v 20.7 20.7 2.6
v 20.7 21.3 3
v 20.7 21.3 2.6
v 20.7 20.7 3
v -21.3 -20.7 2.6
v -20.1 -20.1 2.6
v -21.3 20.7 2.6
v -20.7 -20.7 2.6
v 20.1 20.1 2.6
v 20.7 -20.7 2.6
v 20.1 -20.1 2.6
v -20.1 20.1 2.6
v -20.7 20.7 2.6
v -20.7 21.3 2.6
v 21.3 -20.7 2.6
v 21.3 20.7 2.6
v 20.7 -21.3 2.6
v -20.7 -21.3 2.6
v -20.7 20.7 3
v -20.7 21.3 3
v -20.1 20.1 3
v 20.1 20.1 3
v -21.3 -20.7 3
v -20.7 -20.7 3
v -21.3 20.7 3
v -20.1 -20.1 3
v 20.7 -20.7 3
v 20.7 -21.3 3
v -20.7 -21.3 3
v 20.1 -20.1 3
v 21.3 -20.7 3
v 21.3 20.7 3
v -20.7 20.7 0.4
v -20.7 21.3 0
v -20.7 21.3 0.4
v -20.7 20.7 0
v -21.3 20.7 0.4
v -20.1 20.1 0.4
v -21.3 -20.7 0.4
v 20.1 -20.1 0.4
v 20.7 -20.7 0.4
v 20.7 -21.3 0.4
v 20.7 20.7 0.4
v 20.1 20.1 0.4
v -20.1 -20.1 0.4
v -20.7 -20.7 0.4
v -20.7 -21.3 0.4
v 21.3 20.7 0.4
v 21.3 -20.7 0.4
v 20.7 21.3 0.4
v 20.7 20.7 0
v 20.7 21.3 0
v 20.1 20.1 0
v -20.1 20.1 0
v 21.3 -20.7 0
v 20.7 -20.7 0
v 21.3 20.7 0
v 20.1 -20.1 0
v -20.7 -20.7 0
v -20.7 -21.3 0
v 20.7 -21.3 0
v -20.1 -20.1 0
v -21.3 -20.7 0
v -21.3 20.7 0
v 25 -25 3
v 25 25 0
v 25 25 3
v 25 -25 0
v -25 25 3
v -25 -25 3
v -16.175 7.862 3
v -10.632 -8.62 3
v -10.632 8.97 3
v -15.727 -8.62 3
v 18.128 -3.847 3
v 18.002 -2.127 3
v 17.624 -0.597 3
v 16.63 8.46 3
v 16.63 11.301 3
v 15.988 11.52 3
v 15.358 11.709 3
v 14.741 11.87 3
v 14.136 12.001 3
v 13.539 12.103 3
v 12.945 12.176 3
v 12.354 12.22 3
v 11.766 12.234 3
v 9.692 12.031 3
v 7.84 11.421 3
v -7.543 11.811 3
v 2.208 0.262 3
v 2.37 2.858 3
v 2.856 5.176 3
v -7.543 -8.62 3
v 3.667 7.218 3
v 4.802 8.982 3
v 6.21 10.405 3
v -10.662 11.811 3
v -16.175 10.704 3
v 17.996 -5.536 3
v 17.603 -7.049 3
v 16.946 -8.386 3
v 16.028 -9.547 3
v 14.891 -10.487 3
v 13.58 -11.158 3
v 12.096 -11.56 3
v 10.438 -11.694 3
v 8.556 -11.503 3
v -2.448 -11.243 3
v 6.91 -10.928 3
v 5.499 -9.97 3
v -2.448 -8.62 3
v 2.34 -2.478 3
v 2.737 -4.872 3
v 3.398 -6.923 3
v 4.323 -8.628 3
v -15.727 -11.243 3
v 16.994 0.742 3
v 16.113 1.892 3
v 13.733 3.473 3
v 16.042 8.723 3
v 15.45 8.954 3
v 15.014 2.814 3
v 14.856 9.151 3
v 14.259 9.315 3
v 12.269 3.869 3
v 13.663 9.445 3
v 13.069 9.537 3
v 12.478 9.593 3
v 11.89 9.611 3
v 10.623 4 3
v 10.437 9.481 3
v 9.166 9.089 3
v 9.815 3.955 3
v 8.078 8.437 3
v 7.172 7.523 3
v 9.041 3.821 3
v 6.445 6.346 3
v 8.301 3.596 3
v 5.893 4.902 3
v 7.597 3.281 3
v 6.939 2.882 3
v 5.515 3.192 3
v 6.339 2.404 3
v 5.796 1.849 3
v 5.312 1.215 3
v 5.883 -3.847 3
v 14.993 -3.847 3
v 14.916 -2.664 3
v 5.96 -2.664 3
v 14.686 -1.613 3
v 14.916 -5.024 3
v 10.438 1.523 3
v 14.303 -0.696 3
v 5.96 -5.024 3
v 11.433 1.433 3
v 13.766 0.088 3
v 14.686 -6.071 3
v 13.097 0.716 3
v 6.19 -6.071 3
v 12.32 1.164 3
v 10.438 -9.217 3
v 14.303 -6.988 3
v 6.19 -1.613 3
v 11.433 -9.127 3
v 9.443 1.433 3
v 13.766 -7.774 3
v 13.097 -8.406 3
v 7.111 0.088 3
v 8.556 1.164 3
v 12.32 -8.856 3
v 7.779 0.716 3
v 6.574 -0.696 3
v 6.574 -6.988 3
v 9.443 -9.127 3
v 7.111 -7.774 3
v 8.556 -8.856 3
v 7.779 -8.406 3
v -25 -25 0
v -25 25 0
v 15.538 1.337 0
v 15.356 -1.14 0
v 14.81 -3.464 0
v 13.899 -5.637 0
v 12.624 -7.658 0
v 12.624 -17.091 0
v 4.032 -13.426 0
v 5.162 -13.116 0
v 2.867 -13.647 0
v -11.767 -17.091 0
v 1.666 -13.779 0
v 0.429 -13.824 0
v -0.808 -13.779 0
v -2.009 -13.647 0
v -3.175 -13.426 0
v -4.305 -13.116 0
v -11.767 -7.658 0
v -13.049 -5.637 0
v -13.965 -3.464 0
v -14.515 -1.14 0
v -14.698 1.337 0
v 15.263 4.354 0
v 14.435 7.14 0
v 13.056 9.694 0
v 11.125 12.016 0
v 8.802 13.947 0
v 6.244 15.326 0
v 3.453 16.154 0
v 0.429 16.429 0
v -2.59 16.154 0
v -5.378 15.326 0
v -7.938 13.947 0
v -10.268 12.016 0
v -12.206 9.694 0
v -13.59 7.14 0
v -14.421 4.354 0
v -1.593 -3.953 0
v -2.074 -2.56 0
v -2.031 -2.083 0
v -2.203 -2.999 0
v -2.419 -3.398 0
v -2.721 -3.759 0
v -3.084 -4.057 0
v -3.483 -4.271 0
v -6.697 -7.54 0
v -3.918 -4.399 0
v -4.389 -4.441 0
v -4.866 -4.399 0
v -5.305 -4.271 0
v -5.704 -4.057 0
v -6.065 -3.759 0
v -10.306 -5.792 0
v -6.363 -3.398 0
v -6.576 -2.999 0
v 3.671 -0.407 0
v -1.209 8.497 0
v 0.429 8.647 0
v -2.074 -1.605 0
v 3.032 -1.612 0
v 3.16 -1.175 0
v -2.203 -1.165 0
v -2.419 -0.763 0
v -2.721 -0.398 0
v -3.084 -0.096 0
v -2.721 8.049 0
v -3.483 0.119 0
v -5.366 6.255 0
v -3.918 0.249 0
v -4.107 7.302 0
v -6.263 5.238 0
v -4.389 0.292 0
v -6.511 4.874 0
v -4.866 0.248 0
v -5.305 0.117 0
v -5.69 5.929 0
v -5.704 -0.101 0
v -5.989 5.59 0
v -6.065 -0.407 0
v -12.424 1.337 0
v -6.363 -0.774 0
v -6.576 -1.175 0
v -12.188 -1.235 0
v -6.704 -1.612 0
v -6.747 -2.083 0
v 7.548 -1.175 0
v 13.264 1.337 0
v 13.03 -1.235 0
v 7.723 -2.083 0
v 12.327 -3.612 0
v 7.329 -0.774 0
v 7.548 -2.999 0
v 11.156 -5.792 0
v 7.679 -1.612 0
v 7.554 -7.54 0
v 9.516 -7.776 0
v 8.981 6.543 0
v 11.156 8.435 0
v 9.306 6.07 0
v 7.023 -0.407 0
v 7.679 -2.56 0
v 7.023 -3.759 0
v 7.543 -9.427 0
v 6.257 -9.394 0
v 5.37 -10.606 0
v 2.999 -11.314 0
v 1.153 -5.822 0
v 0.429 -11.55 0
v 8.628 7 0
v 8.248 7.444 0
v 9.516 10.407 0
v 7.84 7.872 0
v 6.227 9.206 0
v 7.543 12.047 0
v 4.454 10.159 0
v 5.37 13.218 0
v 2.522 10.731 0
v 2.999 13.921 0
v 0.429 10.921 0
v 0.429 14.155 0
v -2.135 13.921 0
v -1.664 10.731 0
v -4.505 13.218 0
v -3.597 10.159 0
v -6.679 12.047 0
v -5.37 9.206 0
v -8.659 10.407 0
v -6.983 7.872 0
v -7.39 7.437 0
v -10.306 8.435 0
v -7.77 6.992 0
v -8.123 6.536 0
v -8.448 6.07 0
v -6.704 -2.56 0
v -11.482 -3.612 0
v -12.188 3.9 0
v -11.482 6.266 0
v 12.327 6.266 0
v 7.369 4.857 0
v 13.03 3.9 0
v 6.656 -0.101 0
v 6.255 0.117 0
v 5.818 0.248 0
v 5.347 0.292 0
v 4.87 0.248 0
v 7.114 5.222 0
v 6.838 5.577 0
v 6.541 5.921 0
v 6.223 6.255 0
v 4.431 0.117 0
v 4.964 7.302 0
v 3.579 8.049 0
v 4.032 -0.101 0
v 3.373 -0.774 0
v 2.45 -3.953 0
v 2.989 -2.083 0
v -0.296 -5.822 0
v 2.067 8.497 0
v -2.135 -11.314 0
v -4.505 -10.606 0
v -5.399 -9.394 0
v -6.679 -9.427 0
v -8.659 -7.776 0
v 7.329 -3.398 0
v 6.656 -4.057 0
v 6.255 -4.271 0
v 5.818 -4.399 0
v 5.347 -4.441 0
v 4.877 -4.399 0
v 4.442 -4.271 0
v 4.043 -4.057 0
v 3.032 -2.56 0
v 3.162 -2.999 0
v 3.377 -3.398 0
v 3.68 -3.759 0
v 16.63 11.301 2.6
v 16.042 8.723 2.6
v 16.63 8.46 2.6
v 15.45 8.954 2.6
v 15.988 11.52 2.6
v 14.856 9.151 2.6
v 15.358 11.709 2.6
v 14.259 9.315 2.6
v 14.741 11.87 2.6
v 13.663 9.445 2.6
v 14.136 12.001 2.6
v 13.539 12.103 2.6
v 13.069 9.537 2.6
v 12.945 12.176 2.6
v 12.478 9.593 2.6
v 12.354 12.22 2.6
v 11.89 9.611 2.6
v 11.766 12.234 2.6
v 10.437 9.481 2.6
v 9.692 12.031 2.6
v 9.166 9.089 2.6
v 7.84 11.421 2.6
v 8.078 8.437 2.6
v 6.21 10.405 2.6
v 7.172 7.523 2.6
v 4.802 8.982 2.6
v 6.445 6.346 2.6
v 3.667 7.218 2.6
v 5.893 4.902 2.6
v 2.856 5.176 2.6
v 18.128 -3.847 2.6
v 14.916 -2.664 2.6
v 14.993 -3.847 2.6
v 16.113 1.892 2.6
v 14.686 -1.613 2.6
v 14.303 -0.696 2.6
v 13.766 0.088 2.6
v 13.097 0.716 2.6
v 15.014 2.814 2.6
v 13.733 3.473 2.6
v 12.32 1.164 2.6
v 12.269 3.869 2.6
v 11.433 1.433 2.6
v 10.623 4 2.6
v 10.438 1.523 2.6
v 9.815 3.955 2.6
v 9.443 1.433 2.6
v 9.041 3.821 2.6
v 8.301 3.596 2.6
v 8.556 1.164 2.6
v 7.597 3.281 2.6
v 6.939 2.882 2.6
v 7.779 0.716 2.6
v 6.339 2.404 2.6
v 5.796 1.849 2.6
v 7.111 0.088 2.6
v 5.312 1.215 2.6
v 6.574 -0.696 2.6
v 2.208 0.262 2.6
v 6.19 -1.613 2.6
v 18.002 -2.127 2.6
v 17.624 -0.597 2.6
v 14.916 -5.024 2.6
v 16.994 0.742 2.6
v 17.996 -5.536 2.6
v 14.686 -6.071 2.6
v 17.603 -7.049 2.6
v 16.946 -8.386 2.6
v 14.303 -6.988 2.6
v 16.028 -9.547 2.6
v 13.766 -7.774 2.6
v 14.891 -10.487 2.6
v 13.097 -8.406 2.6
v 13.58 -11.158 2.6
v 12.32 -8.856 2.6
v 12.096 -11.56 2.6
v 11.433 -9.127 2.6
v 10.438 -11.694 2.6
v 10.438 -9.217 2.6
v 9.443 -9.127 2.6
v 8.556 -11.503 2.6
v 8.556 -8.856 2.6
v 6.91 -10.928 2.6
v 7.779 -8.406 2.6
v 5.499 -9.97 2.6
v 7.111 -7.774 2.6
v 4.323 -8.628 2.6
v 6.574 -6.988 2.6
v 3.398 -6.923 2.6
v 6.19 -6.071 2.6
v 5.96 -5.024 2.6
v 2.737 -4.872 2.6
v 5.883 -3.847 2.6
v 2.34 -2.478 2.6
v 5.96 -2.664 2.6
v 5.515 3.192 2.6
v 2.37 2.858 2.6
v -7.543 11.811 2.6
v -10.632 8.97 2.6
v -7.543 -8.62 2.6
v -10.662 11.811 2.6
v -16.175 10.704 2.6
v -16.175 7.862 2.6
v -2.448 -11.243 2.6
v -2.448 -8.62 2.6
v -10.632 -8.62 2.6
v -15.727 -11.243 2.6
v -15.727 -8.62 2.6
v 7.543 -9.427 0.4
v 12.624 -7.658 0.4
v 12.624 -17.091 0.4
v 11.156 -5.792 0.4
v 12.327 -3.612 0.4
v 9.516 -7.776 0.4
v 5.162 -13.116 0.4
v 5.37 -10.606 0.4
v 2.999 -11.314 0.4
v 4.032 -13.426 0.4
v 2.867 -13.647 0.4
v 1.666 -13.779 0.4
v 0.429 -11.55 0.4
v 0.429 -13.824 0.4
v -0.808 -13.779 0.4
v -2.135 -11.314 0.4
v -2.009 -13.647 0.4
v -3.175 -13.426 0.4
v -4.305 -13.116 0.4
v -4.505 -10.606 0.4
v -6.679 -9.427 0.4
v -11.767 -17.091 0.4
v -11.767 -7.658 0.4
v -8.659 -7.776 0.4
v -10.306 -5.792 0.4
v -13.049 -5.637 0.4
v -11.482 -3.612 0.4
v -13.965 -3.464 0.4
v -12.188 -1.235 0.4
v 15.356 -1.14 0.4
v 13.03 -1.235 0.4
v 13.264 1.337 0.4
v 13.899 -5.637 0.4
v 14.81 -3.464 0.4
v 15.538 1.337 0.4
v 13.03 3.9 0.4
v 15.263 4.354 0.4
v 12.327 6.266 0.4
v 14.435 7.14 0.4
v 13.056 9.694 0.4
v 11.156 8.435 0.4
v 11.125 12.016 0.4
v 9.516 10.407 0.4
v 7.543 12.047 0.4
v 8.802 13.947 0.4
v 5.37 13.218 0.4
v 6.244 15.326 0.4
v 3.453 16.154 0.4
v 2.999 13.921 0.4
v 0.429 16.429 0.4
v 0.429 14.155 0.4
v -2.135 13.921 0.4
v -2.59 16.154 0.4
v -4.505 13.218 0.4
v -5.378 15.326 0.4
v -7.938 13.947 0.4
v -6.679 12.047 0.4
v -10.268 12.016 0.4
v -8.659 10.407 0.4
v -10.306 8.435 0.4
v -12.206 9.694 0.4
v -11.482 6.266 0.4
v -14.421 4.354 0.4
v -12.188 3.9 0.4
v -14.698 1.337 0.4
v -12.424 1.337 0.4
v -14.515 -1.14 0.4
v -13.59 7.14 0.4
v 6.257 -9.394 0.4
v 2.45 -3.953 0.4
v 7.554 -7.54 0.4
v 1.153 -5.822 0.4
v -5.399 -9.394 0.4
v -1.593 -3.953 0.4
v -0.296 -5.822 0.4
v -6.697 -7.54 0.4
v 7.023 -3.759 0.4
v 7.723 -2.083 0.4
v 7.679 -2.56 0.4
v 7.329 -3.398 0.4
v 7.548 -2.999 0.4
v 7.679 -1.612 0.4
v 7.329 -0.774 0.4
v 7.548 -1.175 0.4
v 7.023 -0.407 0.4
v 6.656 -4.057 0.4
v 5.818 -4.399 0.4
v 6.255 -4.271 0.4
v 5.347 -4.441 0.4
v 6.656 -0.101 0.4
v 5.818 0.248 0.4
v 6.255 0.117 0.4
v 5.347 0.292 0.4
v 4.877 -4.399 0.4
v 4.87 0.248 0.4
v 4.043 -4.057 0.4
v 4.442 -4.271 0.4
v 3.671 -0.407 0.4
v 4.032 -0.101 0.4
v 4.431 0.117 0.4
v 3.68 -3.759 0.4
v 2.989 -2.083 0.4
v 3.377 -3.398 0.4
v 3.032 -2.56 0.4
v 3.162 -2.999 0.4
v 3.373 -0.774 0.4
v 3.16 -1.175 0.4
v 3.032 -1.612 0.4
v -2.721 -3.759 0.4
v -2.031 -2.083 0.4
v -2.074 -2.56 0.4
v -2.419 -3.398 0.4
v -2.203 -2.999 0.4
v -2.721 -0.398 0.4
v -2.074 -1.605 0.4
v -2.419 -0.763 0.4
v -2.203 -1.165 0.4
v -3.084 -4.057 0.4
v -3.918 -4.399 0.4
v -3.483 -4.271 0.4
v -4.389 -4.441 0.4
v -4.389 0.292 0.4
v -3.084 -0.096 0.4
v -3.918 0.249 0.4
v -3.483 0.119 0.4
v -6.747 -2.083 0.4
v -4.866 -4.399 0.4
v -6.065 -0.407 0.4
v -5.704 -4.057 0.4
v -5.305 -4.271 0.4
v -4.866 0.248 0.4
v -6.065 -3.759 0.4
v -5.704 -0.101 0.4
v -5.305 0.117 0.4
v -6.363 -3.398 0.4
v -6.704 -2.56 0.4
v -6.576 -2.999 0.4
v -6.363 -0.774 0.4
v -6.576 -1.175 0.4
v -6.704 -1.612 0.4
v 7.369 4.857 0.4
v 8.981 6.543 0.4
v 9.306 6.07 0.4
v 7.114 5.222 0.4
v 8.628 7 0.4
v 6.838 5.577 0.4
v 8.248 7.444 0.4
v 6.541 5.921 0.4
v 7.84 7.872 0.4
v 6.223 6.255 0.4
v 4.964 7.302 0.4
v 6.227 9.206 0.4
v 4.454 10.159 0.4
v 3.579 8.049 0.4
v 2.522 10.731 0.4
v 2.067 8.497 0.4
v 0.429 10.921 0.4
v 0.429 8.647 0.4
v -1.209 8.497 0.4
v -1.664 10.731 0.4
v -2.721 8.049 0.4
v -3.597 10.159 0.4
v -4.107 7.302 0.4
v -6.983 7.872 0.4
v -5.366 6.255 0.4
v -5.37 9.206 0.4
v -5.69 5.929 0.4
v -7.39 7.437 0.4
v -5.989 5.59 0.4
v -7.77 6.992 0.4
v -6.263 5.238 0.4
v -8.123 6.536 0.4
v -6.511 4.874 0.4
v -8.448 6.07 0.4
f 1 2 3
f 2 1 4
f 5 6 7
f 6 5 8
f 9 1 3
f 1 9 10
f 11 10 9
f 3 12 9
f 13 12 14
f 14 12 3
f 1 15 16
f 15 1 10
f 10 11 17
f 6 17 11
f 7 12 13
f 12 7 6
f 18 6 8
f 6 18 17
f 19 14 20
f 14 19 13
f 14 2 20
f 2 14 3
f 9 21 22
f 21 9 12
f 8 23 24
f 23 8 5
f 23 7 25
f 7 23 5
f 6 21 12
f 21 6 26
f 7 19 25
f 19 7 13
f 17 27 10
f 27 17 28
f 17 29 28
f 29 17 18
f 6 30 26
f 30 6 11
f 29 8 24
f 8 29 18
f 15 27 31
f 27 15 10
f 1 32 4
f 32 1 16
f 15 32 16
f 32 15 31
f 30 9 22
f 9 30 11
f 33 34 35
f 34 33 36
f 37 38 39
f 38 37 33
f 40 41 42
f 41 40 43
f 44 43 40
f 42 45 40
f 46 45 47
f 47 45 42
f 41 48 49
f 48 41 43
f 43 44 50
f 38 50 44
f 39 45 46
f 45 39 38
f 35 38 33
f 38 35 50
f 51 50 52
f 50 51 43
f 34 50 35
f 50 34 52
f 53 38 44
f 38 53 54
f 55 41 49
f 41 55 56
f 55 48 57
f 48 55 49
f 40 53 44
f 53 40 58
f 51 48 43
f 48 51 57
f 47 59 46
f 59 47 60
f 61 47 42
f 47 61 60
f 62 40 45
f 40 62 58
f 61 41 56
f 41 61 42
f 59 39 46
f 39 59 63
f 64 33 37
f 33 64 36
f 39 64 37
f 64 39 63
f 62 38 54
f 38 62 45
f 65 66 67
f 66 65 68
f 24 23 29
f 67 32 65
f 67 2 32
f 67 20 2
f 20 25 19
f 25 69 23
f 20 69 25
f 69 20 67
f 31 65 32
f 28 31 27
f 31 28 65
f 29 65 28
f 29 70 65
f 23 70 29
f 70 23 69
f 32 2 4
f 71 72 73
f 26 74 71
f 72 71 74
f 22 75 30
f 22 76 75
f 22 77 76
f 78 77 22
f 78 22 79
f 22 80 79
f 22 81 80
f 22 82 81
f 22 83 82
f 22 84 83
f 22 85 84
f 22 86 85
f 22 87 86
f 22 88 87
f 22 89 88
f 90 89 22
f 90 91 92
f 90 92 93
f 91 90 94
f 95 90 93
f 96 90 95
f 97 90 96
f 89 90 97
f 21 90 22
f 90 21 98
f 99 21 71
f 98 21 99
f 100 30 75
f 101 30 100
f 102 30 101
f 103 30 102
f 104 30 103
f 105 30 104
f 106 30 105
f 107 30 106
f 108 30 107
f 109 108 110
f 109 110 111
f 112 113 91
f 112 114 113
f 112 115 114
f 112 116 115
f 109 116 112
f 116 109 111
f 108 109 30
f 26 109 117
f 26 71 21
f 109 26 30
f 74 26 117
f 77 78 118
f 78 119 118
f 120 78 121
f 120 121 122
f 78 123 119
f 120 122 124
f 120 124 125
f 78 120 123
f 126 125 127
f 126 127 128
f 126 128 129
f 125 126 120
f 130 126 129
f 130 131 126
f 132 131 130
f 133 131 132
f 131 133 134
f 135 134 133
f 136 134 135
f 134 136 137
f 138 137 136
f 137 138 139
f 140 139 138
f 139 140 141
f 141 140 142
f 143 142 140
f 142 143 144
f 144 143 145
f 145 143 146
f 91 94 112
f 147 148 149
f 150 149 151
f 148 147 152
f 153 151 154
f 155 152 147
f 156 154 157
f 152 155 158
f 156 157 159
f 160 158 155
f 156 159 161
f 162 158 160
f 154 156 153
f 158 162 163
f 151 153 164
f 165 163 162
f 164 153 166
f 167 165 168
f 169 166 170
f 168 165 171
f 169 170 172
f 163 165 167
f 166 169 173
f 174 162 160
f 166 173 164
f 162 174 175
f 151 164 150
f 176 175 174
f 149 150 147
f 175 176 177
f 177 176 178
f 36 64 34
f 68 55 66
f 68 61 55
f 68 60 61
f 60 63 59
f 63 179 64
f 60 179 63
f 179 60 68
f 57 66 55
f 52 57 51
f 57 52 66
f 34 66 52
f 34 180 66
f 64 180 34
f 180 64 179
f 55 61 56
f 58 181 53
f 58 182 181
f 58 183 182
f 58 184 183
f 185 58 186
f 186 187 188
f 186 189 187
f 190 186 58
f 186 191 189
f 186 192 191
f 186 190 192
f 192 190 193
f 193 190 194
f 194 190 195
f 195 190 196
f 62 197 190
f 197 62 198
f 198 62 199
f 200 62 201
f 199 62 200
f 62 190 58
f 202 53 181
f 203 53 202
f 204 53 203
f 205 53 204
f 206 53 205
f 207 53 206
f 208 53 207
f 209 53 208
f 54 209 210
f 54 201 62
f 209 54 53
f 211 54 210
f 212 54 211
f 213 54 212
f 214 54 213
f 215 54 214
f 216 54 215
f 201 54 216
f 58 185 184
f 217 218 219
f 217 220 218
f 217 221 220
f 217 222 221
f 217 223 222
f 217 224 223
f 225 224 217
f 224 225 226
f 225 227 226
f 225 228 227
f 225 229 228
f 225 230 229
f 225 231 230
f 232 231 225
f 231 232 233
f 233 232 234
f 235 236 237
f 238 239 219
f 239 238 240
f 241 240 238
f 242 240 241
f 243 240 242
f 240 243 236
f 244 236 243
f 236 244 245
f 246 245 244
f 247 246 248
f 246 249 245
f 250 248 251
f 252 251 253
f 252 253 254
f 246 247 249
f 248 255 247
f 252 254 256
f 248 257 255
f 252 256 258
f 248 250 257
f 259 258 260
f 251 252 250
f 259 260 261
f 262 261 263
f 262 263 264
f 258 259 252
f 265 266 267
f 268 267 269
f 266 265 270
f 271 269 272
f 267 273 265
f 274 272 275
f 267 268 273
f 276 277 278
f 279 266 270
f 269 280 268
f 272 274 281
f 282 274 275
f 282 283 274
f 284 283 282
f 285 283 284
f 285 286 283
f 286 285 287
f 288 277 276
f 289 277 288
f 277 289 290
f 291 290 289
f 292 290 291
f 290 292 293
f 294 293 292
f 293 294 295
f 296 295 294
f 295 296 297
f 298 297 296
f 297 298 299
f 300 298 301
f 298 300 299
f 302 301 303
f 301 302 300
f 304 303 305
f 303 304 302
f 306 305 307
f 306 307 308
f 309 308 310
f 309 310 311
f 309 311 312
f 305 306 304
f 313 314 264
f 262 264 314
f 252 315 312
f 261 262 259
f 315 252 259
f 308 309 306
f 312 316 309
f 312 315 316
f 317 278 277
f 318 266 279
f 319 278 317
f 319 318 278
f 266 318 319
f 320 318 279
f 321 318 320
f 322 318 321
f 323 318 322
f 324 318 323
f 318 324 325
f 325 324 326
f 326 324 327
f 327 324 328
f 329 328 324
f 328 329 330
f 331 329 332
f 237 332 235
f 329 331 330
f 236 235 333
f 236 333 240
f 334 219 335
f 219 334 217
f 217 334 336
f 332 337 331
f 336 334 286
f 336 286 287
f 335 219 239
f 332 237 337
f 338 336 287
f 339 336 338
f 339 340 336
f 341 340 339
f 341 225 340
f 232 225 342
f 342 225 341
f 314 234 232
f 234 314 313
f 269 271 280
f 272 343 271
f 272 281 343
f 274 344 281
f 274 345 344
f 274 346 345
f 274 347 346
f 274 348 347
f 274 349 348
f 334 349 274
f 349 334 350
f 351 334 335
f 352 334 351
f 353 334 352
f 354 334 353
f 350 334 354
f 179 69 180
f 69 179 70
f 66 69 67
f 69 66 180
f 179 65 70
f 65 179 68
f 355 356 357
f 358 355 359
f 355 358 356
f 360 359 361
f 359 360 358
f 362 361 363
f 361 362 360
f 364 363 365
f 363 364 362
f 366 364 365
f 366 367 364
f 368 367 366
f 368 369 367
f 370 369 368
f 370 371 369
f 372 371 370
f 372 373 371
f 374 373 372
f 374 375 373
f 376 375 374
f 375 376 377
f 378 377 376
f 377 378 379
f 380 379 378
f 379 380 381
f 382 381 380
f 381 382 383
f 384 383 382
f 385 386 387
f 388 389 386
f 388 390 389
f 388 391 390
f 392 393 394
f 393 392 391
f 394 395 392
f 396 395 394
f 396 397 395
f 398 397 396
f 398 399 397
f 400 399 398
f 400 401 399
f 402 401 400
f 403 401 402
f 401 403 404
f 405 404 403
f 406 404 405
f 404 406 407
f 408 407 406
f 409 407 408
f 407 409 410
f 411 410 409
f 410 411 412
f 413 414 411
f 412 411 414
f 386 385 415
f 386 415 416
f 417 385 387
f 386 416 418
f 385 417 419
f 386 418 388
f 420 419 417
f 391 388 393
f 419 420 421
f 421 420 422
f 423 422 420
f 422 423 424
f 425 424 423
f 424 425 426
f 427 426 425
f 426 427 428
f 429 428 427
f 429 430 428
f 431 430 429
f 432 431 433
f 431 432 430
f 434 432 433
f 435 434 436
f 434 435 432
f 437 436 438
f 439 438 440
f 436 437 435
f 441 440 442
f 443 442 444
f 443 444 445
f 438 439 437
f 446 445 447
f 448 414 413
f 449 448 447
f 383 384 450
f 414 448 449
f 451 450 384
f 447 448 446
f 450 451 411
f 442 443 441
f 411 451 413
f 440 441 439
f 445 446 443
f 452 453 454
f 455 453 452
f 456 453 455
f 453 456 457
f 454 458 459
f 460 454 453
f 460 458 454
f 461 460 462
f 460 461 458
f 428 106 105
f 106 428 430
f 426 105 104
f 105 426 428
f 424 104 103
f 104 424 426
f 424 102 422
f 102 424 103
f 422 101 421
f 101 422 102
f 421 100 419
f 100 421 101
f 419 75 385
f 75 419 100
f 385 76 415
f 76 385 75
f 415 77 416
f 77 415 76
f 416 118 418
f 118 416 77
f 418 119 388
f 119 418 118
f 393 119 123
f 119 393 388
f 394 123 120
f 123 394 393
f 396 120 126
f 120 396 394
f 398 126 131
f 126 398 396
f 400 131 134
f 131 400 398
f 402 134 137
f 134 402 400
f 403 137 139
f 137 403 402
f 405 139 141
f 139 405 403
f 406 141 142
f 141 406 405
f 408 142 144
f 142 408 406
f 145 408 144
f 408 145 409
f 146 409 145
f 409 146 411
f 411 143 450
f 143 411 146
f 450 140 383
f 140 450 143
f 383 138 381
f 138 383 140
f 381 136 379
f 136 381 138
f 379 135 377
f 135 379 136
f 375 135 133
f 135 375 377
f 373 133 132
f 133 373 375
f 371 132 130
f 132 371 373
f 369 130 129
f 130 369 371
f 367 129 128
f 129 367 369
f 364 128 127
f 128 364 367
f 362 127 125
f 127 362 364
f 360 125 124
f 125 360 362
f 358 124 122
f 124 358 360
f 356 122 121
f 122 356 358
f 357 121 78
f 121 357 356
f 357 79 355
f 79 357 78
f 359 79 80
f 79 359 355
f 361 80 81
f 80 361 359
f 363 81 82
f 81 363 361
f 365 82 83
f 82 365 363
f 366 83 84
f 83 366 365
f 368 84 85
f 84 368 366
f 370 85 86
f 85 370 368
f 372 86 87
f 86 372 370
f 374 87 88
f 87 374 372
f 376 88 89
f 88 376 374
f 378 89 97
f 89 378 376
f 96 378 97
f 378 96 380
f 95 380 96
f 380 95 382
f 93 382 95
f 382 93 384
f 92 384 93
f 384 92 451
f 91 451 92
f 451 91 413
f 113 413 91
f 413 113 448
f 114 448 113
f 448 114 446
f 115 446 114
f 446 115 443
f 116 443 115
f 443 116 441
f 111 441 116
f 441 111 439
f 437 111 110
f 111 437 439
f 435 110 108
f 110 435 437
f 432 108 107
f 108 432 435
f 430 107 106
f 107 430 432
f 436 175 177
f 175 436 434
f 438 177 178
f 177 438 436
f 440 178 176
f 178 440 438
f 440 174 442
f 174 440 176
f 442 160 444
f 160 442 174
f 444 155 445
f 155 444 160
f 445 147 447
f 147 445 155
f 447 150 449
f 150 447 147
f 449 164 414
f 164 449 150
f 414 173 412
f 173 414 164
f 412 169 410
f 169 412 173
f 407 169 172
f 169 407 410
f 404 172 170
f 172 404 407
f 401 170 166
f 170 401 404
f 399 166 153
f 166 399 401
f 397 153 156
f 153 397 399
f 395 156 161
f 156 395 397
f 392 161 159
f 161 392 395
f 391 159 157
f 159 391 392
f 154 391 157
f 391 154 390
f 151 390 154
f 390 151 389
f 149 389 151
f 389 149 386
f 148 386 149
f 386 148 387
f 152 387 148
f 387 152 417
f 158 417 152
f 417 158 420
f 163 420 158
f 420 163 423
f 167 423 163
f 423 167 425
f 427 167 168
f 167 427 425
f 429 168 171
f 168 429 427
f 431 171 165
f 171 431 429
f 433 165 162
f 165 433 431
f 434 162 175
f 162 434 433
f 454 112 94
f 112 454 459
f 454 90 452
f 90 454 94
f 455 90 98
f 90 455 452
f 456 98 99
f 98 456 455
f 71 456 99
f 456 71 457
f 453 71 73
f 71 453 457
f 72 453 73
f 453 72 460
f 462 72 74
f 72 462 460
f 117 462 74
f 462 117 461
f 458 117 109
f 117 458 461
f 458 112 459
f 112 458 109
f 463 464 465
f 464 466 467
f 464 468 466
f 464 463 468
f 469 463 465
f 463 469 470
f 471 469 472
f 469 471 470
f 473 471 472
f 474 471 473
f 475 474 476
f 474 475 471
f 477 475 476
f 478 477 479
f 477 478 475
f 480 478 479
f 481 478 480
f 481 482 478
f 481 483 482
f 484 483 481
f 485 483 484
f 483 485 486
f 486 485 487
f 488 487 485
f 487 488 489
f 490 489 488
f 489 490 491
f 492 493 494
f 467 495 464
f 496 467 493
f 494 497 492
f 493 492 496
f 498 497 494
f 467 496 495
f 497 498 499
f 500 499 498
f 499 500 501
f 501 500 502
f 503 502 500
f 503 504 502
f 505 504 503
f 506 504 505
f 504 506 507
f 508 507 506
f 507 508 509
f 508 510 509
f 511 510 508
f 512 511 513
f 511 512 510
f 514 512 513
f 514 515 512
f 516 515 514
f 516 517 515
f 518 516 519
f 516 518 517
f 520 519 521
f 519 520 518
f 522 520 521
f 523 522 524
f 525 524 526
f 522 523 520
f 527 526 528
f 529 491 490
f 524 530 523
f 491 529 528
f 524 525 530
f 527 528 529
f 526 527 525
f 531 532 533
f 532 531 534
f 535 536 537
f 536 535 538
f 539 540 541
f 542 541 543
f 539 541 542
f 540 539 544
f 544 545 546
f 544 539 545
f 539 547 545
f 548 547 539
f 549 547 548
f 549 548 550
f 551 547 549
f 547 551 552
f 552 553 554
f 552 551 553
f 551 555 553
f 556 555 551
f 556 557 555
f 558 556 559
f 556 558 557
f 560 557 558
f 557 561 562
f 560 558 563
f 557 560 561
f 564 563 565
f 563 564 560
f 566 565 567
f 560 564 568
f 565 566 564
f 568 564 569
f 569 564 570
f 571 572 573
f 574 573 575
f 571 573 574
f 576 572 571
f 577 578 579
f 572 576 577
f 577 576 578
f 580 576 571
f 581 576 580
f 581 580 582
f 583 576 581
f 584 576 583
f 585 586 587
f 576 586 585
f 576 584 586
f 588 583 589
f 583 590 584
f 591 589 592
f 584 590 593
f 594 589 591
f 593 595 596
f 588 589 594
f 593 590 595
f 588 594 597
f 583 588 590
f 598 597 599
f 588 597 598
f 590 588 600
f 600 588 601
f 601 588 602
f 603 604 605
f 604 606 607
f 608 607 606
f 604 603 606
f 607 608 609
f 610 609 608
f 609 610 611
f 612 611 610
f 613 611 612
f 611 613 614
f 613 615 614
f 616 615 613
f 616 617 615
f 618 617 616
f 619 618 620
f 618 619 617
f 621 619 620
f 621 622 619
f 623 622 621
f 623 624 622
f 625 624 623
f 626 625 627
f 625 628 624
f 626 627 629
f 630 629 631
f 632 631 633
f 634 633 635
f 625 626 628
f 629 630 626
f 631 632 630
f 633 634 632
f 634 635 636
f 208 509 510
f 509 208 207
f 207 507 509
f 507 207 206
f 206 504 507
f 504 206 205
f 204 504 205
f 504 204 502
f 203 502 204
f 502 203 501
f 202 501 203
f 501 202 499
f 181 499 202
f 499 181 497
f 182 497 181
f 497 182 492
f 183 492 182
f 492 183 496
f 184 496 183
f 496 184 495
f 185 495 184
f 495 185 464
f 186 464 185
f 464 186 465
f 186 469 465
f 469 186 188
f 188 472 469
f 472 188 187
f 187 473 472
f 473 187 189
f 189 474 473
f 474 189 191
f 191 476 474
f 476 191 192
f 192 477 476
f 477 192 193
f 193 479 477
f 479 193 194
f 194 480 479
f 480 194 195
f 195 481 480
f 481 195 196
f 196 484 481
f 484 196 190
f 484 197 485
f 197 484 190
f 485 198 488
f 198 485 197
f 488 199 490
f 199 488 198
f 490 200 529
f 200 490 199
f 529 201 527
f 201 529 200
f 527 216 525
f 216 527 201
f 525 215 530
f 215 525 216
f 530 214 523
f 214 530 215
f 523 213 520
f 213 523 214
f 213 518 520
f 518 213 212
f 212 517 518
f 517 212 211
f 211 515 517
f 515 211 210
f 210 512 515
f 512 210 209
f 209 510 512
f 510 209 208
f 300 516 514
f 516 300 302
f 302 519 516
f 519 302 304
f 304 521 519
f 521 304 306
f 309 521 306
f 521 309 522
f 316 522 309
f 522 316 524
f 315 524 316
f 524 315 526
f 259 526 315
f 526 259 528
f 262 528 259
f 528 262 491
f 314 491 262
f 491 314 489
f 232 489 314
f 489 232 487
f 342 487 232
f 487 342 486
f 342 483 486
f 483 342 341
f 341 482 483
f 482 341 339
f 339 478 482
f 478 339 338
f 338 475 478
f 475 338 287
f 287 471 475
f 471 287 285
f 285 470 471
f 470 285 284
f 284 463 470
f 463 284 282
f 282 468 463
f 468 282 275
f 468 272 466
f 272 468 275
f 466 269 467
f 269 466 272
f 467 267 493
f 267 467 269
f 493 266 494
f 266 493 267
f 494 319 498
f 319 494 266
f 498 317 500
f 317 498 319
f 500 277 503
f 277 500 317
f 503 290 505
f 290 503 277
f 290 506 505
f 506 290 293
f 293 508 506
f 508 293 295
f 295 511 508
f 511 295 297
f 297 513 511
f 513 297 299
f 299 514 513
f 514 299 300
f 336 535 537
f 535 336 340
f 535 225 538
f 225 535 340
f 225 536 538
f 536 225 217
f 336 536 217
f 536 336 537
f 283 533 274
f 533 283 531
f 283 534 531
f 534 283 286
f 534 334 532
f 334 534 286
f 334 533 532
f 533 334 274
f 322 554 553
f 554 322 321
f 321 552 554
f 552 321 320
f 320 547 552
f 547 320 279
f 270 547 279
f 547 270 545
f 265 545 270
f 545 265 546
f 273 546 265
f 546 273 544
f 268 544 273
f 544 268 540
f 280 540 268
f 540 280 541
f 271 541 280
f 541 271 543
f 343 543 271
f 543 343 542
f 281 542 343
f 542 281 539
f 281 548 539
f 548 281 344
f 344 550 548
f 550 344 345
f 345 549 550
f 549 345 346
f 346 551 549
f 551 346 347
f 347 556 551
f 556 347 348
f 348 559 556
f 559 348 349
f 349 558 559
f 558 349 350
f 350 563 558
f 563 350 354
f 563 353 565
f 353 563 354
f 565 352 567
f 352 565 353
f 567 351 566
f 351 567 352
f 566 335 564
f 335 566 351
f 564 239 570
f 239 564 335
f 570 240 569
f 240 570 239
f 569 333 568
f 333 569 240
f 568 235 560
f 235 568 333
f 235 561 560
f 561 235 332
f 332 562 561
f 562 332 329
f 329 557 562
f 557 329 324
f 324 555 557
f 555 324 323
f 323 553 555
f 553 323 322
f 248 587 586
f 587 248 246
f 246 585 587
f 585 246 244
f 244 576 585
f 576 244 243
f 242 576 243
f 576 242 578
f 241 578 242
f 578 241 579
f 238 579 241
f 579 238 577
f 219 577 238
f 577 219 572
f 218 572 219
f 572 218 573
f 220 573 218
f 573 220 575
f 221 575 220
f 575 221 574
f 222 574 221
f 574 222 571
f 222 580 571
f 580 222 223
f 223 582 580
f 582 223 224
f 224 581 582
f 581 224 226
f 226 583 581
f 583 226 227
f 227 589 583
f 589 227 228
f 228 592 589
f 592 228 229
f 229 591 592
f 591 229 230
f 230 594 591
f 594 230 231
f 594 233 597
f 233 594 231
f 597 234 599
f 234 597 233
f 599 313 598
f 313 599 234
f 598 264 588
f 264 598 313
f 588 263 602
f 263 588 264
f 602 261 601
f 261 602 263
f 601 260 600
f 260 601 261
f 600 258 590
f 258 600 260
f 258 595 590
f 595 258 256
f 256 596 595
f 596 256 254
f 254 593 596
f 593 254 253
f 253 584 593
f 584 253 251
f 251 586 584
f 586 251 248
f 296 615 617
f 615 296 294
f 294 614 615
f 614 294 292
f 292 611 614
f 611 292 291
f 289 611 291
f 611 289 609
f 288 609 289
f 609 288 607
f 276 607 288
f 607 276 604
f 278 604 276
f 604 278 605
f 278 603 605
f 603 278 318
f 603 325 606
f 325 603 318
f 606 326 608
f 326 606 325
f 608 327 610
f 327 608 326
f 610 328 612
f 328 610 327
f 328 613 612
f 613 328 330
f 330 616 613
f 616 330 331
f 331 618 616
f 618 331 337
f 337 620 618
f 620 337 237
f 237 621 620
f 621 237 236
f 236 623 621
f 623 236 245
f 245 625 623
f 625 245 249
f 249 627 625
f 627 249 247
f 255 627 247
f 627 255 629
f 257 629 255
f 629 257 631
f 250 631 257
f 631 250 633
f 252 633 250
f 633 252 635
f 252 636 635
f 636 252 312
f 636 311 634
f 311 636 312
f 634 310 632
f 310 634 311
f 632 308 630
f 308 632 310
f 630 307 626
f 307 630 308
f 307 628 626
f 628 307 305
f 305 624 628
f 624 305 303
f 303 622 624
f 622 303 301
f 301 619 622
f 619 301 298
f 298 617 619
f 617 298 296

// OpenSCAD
// -*- mode: SCAD ; c-file-style: "ellemtel" ; coding: utf-8 -*-
//
// Calender tablets for otvinta3d’s flip calender with nicer font and
// German text.
//
// © 2017 Roland Sieker <ospalh@gmail.com>
// Licence: CC-BY-SA 4.0
//


// This part is a recreation. The rest of the calender is either modified or original.
// Sourec of the original
// © 2016 otvinta3d CC-BY
// https://www.thingiverse.com/thing:1785261
// http://www.otvinta.com/download04.html

text_32_1 = "🕴";
// text_32_2 = "drehen";
text_33_1 = "😈";
// text_33_2 = "drehen";
text_34_1 = "☮";
// text_34_2 = "";
// text_34_1 = "";
// logo_34 = "NN.dxf";

font = "Demos LT:style=Semibold";
// font_34 = "DejaVu Sans:style=Bold";
// font_32 =  "DejaVu Sans:style=Bold";
font_32 = "Symbola";
// font_33 = "FreeSerif";
font_33 = "Symbola";
font_34 = "FreeSerif";

w = 50; // width of the plate
p = 3;  // height of the plate

bw = 4.3;  // Border width
nw = 1.2;
td = 0.4;  // Text depth

textsize_day = 0.55* (w-2*bw);
textsize_32 = 0.7 * (w-2*bw);
textsize_33 = 0.6 * (w-2*bw);
// textsize_34 = 0.15 * (w-2*bw);
textsize_34 = 0.7 * (w-2*bw);
spacing = 1.5;


some_distance = 55;
ms = 0.01;  // Muggeseggele.


// Generate cards from 1 through 17.
front_day = 16;

translate([0,0,p/2])
{
   calender_card(front_day);
}


module calender_card(front_day)
{
   difference()
   {
      notched_card();
      day_text(front_day);
      rotate([180,0,0])
      {
         day_text(front_day+17);
      }
   }
}


module notched_card()
{
   difference()
   {
      cube([w,w,p], center=true);
      notches();
      rotate([0,180,0])
      {
         notches();
      }
   }
}

module notches()
{
   for (quad=[0,90,180,270])
   {
      rotate(quad)
      {
         notch();
      }
   }
}
module notch()
{
   translate([0,w/2-bw,p/2])
   {
      cube([w-2*bw, nw, 2*td], center=true);
   }
}



module day_text(day)
{
   translate([0,0,p/2-td])
   {
      linear_extrude(2*td)
      {
         day_text_2d(day);
      }
   }
}


module day_text_2d(day)
{
   if (day <= 31)
   {
      big_text(day);
   }
   if (32 == day)
   {
      text_32();
   }
   if (33 == day)
   {
      text_33();
   }
   if (34 == day)
   {
      text_34();
   }
}

module big_text(day)
{
   text(
      text=str(day), halign="center", valign="center", font=font,
      size=textsize_day);
}


module text_32()
{
   // translate([0, 0.5*spacing*textsize_32])
   {
      text(
         text=text_32_1, halign="center", valign="center", font=font_32,
         size=textsize_32);
   }
}
module text_33()
{
   // translate([0, 0.5*spacing*textsize_33])
   {
      text(
         text=text_33_1, halign="center", valign="center", font=font_33,
         size=textsize_33);
   }

}

module text_34()
{
   text(
      text=text_34_1, halign="center", valign="center", font=font_34,
      size=textsize_34);
}

//module text_34()
//{
//   translate([0, 0.5*spacing*textsize_34])
//   {
//      text(
//         text=text_34_1, halign="center", valign="center", font=font,
//         size=textsize_34);
//   }
//   translate([0, -0.5*spacing*textsize_34])
//   {
//      text(
//         text=text_34_2, halign="center", valign="center", font=font,
//         size=textsize_34);
//   }
//}
